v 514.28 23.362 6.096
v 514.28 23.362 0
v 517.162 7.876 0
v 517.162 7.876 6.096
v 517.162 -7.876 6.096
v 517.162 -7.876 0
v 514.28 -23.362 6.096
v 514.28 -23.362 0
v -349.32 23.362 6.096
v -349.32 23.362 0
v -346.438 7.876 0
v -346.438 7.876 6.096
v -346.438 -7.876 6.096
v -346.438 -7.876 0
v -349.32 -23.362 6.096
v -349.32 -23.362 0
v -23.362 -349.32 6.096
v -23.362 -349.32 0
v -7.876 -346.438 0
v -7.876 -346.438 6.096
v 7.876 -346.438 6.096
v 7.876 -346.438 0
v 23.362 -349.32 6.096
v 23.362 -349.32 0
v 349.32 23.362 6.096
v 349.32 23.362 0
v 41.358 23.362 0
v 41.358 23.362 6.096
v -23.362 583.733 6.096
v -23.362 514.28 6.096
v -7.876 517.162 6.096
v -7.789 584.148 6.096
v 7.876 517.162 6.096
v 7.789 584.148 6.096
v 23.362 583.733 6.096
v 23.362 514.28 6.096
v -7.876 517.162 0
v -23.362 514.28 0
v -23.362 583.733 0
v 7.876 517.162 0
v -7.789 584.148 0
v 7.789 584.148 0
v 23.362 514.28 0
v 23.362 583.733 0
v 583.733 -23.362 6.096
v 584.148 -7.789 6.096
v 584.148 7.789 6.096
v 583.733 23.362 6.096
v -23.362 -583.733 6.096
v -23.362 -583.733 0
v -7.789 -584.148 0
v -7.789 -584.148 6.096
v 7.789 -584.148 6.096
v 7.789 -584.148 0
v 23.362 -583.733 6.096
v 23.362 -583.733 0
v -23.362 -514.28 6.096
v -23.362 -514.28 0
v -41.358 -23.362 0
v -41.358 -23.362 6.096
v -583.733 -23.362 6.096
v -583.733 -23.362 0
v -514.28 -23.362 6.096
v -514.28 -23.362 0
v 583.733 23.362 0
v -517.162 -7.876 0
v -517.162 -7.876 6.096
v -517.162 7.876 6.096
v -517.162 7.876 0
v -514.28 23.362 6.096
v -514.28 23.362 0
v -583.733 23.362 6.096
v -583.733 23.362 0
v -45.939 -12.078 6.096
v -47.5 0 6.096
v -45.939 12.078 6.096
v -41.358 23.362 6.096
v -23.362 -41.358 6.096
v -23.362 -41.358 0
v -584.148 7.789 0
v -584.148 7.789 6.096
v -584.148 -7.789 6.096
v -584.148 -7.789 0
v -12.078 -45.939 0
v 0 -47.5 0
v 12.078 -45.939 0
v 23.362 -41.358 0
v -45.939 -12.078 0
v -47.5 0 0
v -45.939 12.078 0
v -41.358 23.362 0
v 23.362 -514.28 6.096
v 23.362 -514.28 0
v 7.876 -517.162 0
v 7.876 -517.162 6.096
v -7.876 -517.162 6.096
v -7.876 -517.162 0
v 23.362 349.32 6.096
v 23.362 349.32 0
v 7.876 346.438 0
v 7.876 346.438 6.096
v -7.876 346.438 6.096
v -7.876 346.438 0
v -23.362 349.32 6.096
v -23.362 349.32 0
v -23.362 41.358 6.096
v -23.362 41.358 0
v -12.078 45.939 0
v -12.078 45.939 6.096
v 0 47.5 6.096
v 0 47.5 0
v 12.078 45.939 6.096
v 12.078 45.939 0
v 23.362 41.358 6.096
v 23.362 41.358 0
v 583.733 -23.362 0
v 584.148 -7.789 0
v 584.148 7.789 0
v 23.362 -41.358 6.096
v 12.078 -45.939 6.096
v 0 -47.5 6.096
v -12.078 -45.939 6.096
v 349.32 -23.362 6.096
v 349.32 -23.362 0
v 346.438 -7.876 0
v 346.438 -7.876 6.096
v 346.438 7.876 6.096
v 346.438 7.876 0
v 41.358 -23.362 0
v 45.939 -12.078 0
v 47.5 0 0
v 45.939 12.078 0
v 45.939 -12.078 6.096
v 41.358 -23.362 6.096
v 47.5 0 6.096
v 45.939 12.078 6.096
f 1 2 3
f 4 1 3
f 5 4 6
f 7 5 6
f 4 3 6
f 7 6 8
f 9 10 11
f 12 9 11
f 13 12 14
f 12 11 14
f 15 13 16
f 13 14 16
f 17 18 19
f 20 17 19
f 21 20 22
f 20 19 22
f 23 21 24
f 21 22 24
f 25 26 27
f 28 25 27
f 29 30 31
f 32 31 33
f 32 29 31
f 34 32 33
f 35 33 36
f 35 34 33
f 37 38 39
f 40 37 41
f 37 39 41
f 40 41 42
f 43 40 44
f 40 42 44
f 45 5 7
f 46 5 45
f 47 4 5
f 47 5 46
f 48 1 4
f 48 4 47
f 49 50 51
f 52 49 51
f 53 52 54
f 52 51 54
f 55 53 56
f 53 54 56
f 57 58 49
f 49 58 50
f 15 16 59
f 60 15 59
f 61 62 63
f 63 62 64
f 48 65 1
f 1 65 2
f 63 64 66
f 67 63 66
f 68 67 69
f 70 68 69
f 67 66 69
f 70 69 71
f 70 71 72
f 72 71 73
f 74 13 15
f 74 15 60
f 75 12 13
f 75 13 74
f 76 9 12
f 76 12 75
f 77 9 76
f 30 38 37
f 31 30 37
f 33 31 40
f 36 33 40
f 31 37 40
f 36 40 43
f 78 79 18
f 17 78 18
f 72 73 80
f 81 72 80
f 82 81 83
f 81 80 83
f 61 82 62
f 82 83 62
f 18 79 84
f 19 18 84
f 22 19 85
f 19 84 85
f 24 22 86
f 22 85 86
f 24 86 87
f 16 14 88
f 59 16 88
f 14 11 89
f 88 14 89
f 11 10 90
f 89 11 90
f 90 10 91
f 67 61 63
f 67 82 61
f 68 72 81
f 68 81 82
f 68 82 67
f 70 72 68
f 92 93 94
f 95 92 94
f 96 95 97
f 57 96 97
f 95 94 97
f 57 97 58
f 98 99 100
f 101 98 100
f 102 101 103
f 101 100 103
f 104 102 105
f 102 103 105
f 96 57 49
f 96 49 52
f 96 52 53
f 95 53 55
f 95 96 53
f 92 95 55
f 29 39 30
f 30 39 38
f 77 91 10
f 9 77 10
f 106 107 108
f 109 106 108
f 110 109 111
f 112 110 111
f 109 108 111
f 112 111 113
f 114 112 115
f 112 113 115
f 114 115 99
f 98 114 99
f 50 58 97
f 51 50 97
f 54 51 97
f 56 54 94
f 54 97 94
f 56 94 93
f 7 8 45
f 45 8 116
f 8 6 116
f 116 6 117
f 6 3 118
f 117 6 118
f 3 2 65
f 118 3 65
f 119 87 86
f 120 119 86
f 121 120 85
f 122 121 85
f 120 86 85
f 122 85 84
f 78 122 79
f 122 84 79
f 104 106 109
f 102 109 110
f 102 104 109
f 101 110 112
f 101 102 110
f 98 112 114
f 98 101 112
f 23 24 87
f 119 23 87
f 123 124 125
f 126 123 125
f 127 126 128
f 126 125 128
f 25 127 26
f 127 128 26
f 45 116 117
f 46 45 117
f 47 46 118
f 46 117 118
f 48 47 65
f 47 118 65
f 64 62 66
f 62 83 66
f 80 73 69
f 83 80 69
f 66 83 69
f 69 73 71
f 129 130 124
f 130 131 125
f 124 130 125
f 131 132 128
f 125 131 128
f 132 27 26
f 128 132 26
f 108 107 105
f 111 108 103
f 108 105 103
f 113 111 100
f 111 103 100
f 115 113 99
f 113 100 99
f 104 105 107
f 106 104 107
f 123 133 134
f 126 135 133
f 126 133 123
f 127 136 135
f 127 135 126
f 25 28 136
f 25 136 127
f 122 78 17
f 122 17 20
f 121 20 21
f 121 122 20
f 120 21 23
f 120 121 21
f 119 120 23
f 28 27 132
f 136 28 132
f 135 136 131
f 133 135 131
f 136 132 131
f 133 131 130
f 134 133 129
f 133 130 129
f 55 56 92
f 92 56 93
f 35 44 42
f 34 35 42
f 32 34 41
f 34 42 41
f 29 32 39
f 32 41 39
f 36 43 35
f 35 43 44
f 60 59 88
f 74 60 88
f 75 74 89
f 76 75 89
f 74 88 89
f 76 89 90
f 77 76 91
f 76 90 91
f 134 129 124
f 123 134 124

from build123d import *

# Parameters (mm, degrees)
BOSS_EXTRUDE1_DEPTH   = 6.096
BOSS_EXTRUDE1_2_DEPTH = 6.096
BOSS_EXTRUDE1_3_DEPTH = 6.096
BOSS_EXTRUDE1_4_DEPTH = 6.096
BOSS_EXTRUDE1_5_DEPTH = 6.096
BOSS_EXTRUDE1_6_DEPTH = 6.096
BOSS_EXTRUDE1_7_DEPTH = 6.096
BOSS_EXTRUDE1_8_DEPTH = 6.096


with BuildPart() as part:
    # Sketch1 → Boss-Extrude1 (new body)
    with BuildSketch(Plane.XY):
        with BuildLine():
            Line((-583.732686609, -23.362161365), (-514.280209998, -23.362161365))
            ThreePointArc((-514.280209998, -23.362161365), (-517.525, 0), (-514.280209998, 23.362161365))
            Line((-514.280209998, 23.362161365), (-583.732686609, 23.362161365))
            ThreePointArc((-583.732686609, 23.362161365), (-584.2, 0), (-583.732686609, -23.362161365))
        make_face()
    extrude(amount=BOSS_EXTRUDE1_DEPTH)


with BuildPart() as body_2:
    # Sketch1 → Boss-Extrude1 2 (new body)
    with BuildSketch(Plane.XY):
        with BuildLine():
            Line((-23.362161365, 583.732686609), (-23.362161365, 514.280209998))
            ThreePointArc((-23.362161365, 514.280209998), (0, 517.525), (23.362161365, 514.280209998))
            Line((23.362161365, 514.280209998), (23.362161365, 583.732686609))
            ThreePointArc((23.362161365, 583.732686609), (0, 584.2), (-23.362161365, 583.732686609))
        make_face()
    extrude(amount=BOSS_EXTRUDE1_2_DEPTH)


with BuildPart() as body_3:
    # Sketch1 → Boss-Extrude1 3 (new body)
    with BuildSketch(Plane.XY):
        with BuildLine():
            Line((583.732686609, 23.362161365), (514.280209998, 23.362161365))
            ThreePointArc((514.280209998, 23.362161365), (517.525, 0), (514.280209998, -23.362161365))
            Line((514.280209998, -23.362161365), (583.732686609, -23.362161365))
            ThreePointArc((583.732686609, -23.362161365), (584.2, 0), (583.732686609, 23.362161365))
        make_face()
    extrude(amount=BOSS_EXTRUDE1_3_DEPTH)


with BuildPart() as body_4:
    # Sketch1 → Boss-Extrude1 4 (new body)
    with BuildSketch(Plane.XY):
        with BuildLine():
            Line((23.362161365, -583.732686609), (23.362161365, -514.280209998))
            ThreePointArc((23.362161365, -514.280209998), (0, -517.525), (-23.362161365, -514.280209998))
            Line((-23.362161365, -514.280209998), (-23.362161365, -583.732686609))
            ThreePointArc((-23.362161365, -583.732686609), (0, -584.2), (23.362161365, -583.732686609))
        make_face()
    extrude(amount=BOSS_EXTRUDE1_4_DEPTH)


with BuildPart() as body_5:
    # Sketch1 → Boss-Extrude1 5 (new body)
    with BuildSketch(Plane.XY):
        with BuildLine():
            Line((-23.362161365, -41.357700811), (-23.362161365, -349.319790002))
            ThreePointArc((-23.362161365, -349.319790002), (0, -346.075), (23.362161365, -349.319790002))
            Line((23.362161365, -349.319790002), (23.362161365, -41.357700811))
            ThreePointArc((23.362161365, -41.357700811), (0, -47.5), (-23.362161365, -41.357700811))
        make_face()
    extrude(amount=BOSS_EXTRUDE1_5_DEPTH)


with BuildPart() as body_6:
    # Sketch1 → Boss-Extrude1 6 (new body)
    with BuildSketch(Plane.XY):
        with BuildLine():
            Line((41.357700811, -23.362161365), (349.319790002, -23.362161365))
            ThreePointArc((349.319790002, -23.362161365), (346.075, 0), (349.319790002, 23.362161365))
            Line((349.319790002, 23.362161365), (41.357700811, 23.362161365))
            ThreePointArc((41.357700811, 23.362161365), (47.5, 0), (41.357700811, -23.362161365))
        make_face()
    extrude(amount=BOSS_EXTRUDE1_6_DEPTH)


with BuildPart() as body_7:
    # Sketch1 → Boss-Extrude1 7 (new body)
    with BuildSketch(Plane.XY):
        with BuildLine():
            Line((-23.362161365, 349.319790002), (-23.362161365, 41.357700811))
            ThreePointArc((-23.362161365, 41.357700811), (0, 47.5), (23.362161365, 41.357700811))
            Line((23.362161365, 41.357700811), (23.362161365, 349.319790002))
            ThreePointArc((23.362161365, 349.319790002), (0, 346.075), (-23.362161365, 349.319790002))
        make_face()
    extrude(amount=BOSS_EXTRUDE1_7_DEPTH)


with BuildPart() as body_8:
    # Sketch1 → Boss-Extrude1 8 (new body)
    with BuildSketch(Plane.XY):
        with BuildLine():
            Line((-41.357700811, 23.362161365), (-349.319790002, 23.362161365))
            ThreePointArc((-349.319790002, 23.362161365), (-346.075, 0), (-349.319790002, -23.362161365))
            Line((-349.319790002, -23.362161365), (-41.357700811, -23.362161365))
            ThreePointArc((-41.357700811, -23.362161365), (-47.5, 0), (-41.357700811, 23.362161365))
        make_face()
    extrude(amount=BOSS_EXTRUDE1_8_DEPTH)


solid = Compound([part.part, body_2.part, body_3.part, body_4.part, body_5.part, body_6.part, body_7.part, body_8.part])
